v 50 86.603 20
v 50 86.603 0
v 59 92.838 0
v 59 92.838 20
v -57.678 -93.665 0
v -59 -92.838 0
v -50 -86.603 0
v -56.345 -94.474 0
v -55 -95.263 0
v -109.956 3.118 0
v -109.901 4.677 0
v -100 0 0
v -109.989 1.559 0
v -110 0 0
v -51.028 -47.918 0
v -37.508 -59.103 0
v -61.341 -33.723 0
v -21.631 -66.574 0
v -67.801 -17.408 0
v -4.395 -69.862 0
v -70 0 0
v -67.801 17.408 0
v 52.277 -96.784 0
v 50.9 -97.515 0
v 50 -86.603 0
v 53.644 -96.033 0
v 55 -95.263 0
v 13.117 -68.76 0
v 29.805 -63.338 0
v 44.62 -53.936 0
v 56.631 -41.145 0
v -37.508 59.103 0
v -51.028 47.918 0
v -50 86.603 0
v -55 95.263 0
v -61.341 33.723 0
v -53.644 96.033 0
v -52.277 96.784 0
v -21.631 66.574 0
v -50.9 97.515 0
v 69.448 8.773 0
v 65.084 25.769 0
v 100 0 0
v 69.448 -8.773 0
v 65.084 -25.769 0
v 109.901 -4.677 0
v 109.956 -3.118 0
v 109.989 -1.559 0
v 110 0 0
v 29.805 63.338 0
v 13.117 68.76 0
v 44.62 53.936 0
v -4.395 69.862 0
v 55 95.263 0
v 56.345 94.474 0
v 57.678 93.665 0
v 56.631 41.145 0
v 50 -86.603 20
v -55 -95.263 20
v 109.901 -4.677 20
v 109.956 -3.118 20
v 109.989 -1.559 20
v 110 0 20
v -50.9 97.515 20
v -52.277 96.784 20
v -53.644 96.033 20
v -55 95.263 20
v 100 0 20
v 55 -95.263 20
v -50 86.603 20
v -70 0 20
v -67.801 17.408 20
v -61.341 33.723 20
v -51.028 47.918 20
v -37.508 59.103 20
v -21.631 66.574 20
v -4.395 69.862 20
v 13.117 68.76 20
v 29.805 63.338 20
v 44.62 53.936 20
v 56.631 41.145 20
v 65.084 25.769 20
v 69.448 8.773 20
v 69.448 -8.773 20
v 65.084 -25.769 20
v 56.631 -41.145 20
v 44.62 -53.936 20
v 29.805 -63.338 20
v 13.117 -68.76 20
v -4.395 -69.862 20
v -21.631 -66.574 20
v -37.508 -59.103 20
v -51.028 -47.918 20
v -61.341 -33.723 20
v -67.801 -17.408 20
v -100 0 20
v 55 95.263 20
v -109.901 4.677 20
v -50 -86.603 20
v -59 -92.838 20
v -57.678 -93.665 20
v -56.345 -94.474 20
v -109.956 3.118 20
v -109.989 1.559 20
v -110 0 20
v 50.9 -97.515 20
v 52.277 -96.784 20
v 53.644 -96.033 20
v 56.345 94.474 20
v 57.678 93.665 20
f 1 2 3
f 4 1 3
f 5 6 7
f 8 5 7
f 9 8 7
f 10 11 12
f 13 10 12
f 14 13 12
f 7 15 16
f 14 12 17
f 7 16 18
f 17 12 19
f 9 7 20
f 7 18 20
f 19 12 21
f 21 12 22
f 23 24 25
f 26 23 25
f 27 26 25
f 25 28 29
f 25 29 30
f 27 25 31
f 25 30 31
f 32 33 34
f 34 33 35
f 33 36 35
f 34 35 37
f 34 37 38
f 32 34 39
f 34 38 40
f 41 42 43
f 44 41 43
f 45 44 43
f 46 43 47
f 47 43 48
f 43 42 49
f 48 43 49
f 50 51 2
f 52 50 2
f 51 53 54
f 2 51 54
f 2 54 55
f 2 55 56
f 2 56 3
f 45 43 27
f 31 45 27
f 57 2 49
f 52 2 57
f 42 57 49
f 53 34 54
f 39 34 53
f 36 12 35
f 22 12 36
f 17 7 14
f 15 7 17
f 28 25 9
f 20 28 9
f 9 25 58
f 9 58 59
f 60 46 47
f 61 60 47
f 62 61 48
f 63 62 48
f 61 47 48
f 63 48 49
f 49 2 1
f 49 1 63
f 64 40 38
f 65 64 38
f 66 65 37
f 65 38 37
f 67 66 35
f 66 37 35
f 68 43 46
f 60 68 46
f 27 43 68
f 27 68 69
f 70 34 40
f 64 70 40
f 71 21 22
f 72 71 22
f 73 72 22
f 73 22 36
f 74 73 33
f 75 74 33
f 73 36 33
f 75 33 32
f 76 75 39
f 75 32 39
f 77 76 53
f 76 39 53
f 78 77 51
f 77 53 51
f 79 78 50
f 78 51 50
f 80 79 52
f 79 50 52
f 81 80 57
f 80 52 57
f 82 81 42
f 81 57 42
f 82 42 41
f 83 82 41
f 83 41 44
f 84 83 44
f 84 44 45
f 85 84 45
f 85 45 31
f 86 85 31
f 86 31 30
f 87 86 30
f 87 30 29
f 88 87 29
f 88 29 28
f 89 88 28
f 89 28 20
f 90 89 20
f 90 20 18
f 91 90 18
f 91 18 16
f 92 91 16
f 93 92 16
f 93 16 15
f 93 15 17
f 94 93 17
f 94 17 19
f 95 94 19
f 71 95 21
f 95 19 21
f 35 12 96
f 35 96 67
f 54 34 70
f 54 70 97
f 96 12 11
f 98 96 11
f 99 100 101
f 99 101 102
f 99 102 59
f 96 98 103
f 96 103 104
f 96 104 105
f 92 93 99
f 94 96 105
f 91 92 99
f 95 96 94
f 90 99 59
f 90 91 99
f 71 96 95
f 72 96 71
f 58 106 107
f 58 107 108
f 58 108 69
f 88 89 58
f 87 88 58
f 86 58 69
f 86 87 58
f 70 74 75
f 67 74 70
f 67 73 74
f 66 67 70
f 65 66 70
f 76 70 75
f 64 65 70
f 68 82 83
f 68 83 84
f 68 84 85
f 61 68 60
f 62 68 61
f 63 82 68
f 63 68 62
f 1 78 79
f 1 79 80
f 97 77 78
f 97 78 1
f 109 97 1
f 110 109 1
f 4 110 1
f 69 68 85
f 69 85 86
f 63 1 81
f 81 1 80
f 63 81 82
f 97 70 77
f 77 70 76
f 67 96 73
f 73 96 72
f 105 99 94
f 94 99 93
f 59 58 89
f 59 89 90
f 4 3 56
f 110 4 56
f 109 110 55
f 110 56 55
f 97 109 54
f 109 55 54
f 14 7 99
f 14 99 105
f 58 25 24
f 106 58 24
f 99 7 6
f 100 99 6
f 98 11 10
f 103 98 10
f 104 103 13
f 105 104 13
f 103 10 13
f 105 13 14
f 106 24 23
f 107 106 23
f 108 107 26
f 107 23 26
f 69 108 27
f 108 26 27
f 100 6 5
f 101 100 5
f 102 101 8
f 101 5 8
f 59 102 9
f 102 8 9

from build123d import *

# Parameters (mm, degrees)
BOSS_EXTRUDE1_DEPTH = 20
SKETCH7_R           = 70
CUT_EXTRUDE1_DEPTH  = 149.354929298


with BuildPart() as part:
    # Sketch4 → Boss-Extrude1 (new body)
    with BuildSketch(Plane.XY):
        Polygon((-50, -86.602540378), (50, -86.602540378), (100, 0), (50, 86.602540378), (-50, 86.602540378), (-100, 0), align=None)
        Polygon((-50, -86.602540378), (-110, 0), (-100, 0), align=None)
        Polygon((-100, 0), (-55, 95.262794416), (-50, 86.602540378), align=None)
        Polygon((-50, 86.602540378), (55, 95.262794416), (50, 86.602540378), align=None)
        Polygon((50, 86.602540378), (110, 0), (100, 0), align=None)
        Polygon((100, 0), (55, -95.262794416), (50, -86.602540378), align=None)
        Polygon((50, -86.602540378), (-55, -95.262794416), (-50, -86.602540378), align=None)
        with BuildLine():
            Line((-55, 95.262794416), (-50, 86.602540378))
            Line((-50, 86.602540378), (-50.900048654, 97.515050362))
            ThreePointArc((-50.900048654, 97.515050362), (-52.961998078, 96.410719111), (-55, 95.262794416))
        make_face()
        with BuildLine():
            Line((55, 95.262794416), (50, 86.602540378))
            Line((50, 86.602540378), (59.000486538, 92.838260369))
            ThreePointArc((59.000486538, 92.838260369), (57.013132909, 94.071795327), (55, 95.262794416))
        make_face()
        with BuildLine():
            Line((110, 0), (100, 0))
            Line((100, 0), (109.900535191, -4.676789993))
            ThreePointArc((109.900535191, -4.676789993), (109.975130987, -2.338923785), (110, 0))
        make_face()
        with BuildLine():
            Line((55, -95.262794416), (50, -86.602540378))
            Line((50, -86.602540378), (50.900048654, -97.515050362))
            ThreePointArc((50.900048654, -97.515050362), (52.961998078, -96.410719111), (55, -95.262794416))
        make_face()
        with BuildLine():
            Line((-55, -95.262794416), (-50, -86.602540378))
            Line((-50, -86.602540378), (-59.000486538, -92.838260369))
            ThreePointArc((-59.000486538, -92.838260369), (-57.013132909, -94.071795327), (-55, -95.262794416))
        make_face()
        with BuildLine():
            Line((-110, 0), (-100, 0))
            Line((-100, 0), (-109.900535191, 4.676789993))
            ThreePointArc((-109.900535191, 4.676789993), (-109.975130987, 2.338923785), (-110, 0))
        make_face()
    extrude(amount=BOSS_EXTRUDE1_DEPTH)

    # Sketch7 → Cut-Extrude1 (cut, through all)
    with BuildSketch(Plane(origin=(0, 0, 0), x_dir=(-1, 0, 0), z_dir=(0, 0, -1))):
        Circle(SKETCH7_R)
    extrude(amount=-CUT_EXTRUDE1_DEPTH, mode=Mode.SUBTRACT)


solid = part.part
